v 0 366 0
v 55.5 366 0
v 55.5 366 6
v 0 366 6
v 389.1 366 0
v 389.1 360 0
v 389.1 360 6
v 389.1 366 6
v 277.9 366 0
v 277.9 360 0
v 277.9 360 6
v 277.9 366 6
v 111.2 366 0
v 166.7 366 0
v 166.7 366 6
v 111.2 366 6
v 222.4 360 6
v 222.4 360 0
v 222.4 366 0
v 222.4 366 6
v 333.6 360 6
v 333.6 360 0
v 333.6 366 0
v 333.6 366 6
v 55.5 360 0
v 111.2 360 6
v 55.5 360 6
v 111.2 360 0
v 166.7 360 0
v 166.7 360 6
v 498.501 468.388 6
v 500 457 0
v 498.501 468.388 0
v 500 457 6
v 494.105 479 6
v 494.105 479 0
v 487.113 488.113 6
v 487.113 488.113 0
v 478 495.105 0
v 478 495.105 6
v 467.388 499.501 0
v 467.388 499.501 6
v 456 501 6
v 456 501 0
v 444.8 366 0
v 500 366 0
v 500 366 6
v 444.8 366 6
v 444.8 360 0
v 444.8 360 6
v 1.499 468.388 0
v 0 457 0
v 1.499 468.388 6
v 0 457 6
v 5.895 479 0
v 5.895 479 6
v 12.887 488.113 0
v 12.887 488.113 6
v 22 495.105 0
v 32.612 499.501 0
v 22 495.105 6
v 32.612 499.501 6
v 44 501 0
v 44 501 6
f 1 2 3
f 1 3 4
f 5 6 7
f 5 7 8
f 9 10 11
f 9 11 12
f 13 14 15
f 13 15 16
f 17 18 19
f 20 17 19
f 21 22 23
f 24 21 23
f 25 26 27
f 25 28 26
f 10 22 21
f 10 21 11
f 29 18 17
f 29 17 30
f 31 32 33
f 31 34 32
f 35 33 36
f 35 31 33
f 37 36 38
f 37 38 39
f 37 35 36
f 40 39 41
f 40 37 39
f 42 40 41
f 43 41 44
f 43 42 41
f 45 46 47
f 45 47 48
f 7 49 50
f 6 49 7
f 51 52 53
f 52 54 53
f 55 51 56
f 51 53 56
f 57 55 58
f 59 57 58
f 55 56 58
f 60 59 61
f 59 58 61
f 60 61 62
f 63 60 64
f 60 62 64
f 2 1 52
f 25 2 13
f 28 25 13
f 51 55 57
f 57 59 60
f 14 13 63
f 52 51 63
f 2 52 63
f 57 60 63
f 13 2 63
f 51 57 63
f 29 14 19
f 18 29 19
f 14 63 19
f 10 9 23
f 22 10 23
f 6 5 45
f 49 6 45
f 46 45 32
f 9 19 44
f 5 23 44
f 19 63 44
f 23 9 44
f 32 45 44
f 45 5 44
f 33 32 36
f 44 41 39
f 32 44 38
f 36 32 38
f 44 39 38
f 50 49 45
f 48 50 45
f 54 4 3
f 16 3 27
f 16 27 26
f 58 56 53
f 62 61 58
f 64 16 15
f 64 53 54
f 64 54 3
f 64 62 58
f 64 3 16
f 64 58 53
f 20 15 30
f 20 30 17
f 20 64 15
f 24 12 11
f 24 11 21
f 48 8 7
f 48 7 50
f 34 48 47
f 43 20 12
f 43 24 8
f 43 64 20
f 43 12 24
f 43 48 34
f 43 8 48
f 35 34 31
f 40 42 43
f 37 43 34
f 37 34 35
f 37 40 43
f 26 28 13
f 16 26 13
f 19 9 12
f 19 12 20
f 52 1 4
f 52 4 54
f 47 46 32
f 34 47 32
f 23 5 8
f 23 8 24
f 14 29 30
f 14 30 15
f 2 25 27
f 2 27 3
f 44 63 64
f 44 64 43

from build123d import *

# Parameters (mm, degrees)
SKETCH1_W           = 500
SKETCH1_H           = 501
BOSS_EXTRUDE1_DEPTH = 6
FILLET1_R           = 44
SKETCH2_W           = 55.5
SKETCH2_H           = 6
CUT_EXTRUDE1_DEPTH  = 10
LPATTERN1_COUNT     = 5
LPATTERN1_PITCH     = 111.2
SKETCH3_W           = 500
SKETCH3_H           = 360
CUT_EXTRUDE2_DEPTH  = 10


with BuildPart() as part:
    # Sketch1 → Boss-Extrude1 (new body)
    with BuildSketch(Plane.XY):
        with Locations((250, 250.5)):
            Rectangle(SKETCH1_W, SKETCH1_H)
    extrude(amount=BOSS_EXTRUDE1_DEPTH)

    # Fillet1
    fillet1_edges = [part.edges().sort_by_distance(p)[0] for p in [
        (0, 501, 3),
        (500, 501, 3),
        (500, 0, 3),
        (0, 0, 3),
    ]]
    fillet(fillet1_edges, radius=FILLET1_R)

    # Sketch2 → Cut-Extrude1 (cut)
    with BuildSketch(Plane(origin=(0, 0, 0), x_dir=(-1, 0, 0), z_dir=(0, 0, -1))):
        with Locations((-27.75, 363)):
            Rectangle(SKETCH2_W, SKETCH2_H)
    cut_extrude1 = extrude(amount=-CUT_EXTRUDE1_DEPTH, mode=Mode.SUBTRACT)

    # LPattern1: Cut-Extrude1 ×5
    with Locations(*[(i * LPATTERN1_PITCH, 0, 0) for i in range(1, LPATTERN1_COUNT)]):
        add(cut_extrude1, mode=Mode.SUBTRACT)

    # Sketch3 → Cut-Extrude2 (cut)
    with BuildSketch(Plane(origin=(0, 0, 0), x_dir=(-1, 0, 0), z_dir=(0, 0, -1))):
        with Locations((-250, 180)):
            Rectangle(SKETCH3_W, SKETCH3_H)
    extrude(amount=-CUT_EXTRUDE2_DEPTH, mode=Mode.SUBTRACT)


solid = part.part
